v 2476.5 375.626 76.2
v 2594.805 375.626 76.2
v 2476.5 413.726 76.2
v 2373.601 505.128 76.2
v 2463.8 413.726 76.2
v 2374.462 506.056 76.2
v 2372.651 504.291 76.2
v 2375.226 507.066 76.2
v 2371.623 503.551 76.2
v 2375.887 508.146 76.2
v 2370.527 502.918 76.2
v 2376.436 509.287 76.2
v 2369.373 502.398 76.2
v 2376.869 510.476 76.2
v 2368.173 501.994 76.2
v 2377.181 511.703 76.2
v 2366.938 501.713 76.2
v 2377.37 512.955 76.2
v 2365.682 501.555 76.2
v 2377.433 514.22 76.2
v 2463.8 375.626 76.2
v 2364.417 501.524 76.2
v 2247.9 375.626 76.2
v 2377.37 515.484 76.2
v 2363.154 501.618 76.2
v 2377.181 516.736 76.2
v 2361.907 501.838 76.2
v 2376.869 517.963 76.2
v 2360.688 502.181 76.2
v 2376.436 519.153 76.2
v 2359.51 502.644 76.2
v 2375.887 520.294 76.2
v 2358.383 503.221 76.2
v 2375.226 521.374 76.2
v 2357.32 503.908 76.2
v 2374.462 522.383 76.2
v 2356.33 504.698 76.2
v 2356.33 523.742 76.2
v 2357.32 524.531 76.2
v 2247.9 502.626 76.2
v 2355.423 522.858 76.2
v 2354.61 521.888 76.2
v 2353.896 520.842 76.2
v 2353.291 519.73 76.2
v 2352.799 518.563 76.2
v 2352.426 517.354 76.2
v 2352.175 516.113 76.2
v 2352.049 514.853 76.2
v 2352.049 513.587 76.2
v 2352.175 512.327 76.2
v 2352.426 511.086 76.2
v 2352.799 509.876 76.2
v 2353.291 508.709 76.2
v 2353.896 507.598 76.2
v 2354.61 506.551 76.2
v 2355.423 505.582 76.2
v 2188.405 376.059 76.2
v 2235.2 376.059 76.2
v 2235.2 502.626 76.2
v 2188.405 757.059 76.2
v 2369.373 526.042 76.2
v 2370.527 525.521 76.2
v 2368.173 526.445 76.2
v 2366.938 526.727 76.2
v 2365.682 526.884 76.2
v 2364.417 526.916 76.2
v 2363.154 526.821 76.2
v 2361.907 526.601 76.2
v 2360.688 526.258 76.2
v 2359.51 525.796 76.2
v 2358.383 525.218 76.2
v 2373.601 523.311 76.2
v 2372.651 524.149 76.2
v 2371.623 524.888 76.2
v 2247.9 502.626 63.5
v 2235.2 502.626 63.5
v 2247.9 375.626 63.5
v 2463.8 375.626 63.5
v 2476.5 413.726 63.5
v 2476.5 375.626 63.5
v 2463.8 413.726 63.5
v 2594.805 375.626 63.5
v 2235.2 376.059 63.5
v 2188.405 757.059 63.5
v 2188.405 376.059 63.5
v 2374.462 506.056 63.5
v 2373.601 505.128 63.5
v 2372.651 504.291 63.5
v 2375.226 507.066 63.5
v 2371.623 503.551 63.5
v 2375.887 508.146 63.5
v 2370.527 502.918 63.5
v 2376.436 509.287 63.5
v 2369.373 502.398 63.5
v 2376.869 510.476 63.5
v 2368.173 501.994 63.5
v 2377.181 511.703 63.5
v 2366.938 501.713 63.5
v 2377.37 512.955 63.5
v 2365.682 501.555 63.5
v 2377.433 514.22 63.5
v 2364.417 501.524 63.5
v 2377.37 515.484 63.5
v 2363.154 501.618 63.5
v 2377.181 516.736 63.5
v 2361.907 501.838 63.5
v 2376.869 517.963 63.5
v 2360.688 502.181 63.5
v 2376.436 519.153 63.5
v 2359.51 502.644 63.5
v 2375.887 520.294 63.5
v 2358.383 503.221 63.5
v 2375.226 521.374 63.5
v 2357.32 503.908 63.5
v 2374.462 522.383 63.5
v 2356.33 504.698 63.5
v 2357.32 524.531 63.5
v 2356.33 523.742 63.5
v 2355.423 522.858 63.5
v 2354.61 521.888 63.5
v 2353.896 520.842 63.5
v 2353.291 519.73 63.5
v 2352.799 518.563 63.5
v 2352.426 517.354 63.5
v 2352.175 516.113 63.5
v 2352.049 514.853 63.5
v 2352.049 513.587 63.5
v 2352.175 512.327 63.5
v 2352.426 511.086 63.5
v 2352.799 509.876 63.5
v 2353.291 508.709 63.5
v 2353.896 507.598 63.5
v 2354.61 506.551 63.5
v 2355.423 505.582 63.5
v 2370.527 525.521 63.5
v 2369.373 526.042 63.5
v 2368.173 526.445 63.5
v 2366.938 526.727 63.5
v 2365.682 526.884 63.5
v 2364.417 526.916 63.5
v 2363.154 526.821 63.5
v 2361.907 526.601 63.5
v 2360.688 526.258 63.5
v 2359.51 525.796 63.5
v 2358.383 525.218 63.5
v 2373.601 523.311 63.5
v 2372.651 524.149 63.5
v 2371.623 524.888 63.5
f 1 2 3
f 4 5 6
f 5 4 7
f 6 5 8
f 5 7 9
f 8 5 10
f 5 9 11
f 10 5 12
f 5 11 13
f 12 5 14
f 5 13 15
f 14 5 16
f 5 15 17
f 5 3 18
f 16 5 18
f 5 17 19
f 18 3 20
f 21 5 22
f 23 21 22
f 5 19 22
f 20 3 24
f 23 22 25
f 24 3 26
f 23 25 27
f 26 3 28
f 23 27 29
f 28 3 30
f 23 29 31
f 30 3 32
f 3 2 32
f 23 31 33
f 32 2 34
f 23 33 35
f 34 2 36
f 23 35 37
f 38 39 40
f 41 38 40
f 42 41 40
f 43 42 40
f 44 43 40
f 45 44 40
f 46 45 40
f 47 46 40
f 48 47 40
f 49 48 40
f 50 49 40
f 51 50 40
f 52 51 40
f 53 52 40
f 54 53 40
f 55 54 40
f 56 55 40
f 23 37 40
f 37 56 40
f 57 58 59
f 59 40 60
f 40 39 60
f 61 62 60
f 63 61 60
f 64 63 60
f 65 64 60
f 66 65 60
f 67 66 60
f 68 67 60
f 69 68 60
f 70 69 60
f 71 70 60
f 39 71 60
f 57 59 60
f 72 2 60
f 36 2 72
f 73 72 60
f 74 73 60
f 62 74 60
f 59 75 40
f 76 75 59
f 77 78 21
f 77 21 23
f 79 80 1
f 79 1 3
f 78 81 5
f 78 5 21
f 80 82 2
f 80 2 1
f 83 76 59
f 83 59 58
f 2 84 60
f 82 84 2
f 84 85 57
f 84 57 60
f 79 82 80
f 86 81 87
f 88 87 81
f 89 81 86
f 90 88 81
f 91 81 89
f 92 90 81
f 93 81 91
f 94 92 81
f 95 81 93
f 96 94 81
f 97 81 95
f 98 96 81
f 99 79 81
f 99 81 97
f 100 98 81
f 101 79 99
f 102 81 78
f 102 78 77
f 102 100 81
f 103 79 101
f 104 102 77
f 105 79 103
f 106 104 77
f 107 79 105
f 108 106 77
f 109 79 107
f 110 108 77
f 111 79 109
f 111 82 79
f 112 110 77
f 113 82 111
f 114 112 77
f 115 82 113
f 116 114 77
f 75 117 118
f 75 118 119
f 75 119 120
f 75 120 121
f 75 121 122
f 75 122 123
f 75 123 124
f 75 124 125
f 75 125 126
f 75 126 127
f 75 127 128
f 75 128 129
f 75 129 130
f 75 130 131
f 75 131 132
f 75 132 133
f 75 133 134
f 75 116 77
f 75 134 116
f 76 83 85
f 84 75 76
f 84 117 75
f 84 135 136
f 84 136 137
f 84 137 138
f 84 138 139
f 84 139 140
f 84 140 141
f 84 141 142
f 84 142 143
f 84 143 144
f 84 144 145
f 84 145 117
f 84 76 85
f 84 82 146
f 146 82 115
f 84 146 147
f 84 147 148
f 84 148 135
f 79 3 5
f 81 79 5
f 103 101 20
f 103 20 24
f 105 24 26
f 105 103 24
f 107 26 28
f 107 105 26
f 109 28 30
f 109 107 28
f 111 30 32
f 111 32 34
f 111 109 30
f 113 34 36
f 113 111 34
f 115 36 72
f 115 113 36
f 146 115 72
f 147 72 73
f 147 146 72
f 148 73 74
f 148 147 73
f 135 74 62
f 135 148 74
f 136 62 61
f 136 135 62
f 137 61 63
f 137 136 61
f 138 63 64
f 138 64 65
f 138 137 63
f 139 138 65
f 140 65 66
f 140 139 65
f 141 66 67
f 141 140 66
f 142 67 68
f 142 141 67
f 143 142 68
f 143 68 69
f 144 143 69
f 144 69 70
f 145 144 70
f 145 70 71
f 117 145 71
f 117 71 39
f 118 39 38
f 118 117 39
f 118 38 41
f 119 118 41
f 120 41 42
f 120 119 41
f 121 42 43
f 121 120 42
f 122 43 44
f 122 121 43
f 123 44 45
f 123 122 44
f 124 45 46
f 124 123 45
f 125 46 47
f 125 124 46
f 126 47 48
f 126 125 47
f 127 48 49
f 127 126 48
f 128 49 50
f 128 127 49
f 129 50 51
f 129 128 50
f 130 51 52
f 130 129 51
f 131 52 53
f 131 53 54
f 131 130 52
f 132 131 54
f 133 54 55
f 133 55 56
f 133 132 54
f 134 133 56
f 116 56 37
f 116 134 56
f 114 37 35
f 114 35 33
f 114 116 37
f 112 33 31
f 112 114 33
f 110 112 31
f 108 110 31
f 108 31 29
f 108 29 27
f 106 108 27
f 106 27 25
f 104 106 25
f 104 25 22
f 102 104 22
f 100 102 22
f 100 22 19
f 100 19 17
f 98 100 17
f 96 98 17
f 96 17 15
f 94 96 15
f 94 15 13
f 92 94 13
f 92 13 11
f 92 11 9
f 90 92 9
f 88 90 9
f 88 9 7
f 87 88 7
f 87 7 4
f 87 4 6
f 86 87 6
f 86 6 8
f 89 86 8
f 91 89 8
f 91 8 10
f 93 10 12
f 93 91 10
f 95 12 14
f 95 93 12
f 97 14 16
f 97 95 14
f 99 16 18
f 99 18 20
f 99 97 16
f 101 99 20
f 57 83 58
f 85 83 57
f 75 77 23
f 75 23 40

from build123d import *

# Parameters (mm, degrees)
BOSS_EXTRUDE1_START = 63.5
BOSS_EXTRUDE1_DEPTH = 12.7
CAVITY1_START       = 63.5
CAVITY1_OUTLINE_R   = 12.7
CAVITY1_DEPTH       = 12.7


# Read off the part's stored shape, not the designer's step: Cavity1
with BuildPart() as part:
    # Sketch1 → Boss-Extrude1 (new body)
    with BuildSketch(Plane.XY.offset(BOSS_EXTRUDE1_START)):
        Polygon((2188.405431846, 757.059372145), (2594.805431846, 375.625791085), (2476.5, 375.625791085), (2476.5, 413.725791085), (2463.8, 413.725791085), (2463.8, 375.625791085), (2247.9, 375.625791085), (2247.9, 502.625791085), (2235.2, 502.625791085), (2235.2, 376.059372145), (2188.405431846, 376.059372145), align=None)
    extrude(amount=BOSS_EXTRUDE1_DEPTH)

    # Cavity1 outline → Cavity1 (cut)
    with BuildSketch(Plane.XY.offset(CAVITY1_START)):
        with Locations((2364.733137895, 514.21976629)):
            Circle(CAVITY1_OUTLINE_R)
    extrude(amount=CAVITY1_DEPTH, mode=Mode.SUBTRACT)


solid = part.part
